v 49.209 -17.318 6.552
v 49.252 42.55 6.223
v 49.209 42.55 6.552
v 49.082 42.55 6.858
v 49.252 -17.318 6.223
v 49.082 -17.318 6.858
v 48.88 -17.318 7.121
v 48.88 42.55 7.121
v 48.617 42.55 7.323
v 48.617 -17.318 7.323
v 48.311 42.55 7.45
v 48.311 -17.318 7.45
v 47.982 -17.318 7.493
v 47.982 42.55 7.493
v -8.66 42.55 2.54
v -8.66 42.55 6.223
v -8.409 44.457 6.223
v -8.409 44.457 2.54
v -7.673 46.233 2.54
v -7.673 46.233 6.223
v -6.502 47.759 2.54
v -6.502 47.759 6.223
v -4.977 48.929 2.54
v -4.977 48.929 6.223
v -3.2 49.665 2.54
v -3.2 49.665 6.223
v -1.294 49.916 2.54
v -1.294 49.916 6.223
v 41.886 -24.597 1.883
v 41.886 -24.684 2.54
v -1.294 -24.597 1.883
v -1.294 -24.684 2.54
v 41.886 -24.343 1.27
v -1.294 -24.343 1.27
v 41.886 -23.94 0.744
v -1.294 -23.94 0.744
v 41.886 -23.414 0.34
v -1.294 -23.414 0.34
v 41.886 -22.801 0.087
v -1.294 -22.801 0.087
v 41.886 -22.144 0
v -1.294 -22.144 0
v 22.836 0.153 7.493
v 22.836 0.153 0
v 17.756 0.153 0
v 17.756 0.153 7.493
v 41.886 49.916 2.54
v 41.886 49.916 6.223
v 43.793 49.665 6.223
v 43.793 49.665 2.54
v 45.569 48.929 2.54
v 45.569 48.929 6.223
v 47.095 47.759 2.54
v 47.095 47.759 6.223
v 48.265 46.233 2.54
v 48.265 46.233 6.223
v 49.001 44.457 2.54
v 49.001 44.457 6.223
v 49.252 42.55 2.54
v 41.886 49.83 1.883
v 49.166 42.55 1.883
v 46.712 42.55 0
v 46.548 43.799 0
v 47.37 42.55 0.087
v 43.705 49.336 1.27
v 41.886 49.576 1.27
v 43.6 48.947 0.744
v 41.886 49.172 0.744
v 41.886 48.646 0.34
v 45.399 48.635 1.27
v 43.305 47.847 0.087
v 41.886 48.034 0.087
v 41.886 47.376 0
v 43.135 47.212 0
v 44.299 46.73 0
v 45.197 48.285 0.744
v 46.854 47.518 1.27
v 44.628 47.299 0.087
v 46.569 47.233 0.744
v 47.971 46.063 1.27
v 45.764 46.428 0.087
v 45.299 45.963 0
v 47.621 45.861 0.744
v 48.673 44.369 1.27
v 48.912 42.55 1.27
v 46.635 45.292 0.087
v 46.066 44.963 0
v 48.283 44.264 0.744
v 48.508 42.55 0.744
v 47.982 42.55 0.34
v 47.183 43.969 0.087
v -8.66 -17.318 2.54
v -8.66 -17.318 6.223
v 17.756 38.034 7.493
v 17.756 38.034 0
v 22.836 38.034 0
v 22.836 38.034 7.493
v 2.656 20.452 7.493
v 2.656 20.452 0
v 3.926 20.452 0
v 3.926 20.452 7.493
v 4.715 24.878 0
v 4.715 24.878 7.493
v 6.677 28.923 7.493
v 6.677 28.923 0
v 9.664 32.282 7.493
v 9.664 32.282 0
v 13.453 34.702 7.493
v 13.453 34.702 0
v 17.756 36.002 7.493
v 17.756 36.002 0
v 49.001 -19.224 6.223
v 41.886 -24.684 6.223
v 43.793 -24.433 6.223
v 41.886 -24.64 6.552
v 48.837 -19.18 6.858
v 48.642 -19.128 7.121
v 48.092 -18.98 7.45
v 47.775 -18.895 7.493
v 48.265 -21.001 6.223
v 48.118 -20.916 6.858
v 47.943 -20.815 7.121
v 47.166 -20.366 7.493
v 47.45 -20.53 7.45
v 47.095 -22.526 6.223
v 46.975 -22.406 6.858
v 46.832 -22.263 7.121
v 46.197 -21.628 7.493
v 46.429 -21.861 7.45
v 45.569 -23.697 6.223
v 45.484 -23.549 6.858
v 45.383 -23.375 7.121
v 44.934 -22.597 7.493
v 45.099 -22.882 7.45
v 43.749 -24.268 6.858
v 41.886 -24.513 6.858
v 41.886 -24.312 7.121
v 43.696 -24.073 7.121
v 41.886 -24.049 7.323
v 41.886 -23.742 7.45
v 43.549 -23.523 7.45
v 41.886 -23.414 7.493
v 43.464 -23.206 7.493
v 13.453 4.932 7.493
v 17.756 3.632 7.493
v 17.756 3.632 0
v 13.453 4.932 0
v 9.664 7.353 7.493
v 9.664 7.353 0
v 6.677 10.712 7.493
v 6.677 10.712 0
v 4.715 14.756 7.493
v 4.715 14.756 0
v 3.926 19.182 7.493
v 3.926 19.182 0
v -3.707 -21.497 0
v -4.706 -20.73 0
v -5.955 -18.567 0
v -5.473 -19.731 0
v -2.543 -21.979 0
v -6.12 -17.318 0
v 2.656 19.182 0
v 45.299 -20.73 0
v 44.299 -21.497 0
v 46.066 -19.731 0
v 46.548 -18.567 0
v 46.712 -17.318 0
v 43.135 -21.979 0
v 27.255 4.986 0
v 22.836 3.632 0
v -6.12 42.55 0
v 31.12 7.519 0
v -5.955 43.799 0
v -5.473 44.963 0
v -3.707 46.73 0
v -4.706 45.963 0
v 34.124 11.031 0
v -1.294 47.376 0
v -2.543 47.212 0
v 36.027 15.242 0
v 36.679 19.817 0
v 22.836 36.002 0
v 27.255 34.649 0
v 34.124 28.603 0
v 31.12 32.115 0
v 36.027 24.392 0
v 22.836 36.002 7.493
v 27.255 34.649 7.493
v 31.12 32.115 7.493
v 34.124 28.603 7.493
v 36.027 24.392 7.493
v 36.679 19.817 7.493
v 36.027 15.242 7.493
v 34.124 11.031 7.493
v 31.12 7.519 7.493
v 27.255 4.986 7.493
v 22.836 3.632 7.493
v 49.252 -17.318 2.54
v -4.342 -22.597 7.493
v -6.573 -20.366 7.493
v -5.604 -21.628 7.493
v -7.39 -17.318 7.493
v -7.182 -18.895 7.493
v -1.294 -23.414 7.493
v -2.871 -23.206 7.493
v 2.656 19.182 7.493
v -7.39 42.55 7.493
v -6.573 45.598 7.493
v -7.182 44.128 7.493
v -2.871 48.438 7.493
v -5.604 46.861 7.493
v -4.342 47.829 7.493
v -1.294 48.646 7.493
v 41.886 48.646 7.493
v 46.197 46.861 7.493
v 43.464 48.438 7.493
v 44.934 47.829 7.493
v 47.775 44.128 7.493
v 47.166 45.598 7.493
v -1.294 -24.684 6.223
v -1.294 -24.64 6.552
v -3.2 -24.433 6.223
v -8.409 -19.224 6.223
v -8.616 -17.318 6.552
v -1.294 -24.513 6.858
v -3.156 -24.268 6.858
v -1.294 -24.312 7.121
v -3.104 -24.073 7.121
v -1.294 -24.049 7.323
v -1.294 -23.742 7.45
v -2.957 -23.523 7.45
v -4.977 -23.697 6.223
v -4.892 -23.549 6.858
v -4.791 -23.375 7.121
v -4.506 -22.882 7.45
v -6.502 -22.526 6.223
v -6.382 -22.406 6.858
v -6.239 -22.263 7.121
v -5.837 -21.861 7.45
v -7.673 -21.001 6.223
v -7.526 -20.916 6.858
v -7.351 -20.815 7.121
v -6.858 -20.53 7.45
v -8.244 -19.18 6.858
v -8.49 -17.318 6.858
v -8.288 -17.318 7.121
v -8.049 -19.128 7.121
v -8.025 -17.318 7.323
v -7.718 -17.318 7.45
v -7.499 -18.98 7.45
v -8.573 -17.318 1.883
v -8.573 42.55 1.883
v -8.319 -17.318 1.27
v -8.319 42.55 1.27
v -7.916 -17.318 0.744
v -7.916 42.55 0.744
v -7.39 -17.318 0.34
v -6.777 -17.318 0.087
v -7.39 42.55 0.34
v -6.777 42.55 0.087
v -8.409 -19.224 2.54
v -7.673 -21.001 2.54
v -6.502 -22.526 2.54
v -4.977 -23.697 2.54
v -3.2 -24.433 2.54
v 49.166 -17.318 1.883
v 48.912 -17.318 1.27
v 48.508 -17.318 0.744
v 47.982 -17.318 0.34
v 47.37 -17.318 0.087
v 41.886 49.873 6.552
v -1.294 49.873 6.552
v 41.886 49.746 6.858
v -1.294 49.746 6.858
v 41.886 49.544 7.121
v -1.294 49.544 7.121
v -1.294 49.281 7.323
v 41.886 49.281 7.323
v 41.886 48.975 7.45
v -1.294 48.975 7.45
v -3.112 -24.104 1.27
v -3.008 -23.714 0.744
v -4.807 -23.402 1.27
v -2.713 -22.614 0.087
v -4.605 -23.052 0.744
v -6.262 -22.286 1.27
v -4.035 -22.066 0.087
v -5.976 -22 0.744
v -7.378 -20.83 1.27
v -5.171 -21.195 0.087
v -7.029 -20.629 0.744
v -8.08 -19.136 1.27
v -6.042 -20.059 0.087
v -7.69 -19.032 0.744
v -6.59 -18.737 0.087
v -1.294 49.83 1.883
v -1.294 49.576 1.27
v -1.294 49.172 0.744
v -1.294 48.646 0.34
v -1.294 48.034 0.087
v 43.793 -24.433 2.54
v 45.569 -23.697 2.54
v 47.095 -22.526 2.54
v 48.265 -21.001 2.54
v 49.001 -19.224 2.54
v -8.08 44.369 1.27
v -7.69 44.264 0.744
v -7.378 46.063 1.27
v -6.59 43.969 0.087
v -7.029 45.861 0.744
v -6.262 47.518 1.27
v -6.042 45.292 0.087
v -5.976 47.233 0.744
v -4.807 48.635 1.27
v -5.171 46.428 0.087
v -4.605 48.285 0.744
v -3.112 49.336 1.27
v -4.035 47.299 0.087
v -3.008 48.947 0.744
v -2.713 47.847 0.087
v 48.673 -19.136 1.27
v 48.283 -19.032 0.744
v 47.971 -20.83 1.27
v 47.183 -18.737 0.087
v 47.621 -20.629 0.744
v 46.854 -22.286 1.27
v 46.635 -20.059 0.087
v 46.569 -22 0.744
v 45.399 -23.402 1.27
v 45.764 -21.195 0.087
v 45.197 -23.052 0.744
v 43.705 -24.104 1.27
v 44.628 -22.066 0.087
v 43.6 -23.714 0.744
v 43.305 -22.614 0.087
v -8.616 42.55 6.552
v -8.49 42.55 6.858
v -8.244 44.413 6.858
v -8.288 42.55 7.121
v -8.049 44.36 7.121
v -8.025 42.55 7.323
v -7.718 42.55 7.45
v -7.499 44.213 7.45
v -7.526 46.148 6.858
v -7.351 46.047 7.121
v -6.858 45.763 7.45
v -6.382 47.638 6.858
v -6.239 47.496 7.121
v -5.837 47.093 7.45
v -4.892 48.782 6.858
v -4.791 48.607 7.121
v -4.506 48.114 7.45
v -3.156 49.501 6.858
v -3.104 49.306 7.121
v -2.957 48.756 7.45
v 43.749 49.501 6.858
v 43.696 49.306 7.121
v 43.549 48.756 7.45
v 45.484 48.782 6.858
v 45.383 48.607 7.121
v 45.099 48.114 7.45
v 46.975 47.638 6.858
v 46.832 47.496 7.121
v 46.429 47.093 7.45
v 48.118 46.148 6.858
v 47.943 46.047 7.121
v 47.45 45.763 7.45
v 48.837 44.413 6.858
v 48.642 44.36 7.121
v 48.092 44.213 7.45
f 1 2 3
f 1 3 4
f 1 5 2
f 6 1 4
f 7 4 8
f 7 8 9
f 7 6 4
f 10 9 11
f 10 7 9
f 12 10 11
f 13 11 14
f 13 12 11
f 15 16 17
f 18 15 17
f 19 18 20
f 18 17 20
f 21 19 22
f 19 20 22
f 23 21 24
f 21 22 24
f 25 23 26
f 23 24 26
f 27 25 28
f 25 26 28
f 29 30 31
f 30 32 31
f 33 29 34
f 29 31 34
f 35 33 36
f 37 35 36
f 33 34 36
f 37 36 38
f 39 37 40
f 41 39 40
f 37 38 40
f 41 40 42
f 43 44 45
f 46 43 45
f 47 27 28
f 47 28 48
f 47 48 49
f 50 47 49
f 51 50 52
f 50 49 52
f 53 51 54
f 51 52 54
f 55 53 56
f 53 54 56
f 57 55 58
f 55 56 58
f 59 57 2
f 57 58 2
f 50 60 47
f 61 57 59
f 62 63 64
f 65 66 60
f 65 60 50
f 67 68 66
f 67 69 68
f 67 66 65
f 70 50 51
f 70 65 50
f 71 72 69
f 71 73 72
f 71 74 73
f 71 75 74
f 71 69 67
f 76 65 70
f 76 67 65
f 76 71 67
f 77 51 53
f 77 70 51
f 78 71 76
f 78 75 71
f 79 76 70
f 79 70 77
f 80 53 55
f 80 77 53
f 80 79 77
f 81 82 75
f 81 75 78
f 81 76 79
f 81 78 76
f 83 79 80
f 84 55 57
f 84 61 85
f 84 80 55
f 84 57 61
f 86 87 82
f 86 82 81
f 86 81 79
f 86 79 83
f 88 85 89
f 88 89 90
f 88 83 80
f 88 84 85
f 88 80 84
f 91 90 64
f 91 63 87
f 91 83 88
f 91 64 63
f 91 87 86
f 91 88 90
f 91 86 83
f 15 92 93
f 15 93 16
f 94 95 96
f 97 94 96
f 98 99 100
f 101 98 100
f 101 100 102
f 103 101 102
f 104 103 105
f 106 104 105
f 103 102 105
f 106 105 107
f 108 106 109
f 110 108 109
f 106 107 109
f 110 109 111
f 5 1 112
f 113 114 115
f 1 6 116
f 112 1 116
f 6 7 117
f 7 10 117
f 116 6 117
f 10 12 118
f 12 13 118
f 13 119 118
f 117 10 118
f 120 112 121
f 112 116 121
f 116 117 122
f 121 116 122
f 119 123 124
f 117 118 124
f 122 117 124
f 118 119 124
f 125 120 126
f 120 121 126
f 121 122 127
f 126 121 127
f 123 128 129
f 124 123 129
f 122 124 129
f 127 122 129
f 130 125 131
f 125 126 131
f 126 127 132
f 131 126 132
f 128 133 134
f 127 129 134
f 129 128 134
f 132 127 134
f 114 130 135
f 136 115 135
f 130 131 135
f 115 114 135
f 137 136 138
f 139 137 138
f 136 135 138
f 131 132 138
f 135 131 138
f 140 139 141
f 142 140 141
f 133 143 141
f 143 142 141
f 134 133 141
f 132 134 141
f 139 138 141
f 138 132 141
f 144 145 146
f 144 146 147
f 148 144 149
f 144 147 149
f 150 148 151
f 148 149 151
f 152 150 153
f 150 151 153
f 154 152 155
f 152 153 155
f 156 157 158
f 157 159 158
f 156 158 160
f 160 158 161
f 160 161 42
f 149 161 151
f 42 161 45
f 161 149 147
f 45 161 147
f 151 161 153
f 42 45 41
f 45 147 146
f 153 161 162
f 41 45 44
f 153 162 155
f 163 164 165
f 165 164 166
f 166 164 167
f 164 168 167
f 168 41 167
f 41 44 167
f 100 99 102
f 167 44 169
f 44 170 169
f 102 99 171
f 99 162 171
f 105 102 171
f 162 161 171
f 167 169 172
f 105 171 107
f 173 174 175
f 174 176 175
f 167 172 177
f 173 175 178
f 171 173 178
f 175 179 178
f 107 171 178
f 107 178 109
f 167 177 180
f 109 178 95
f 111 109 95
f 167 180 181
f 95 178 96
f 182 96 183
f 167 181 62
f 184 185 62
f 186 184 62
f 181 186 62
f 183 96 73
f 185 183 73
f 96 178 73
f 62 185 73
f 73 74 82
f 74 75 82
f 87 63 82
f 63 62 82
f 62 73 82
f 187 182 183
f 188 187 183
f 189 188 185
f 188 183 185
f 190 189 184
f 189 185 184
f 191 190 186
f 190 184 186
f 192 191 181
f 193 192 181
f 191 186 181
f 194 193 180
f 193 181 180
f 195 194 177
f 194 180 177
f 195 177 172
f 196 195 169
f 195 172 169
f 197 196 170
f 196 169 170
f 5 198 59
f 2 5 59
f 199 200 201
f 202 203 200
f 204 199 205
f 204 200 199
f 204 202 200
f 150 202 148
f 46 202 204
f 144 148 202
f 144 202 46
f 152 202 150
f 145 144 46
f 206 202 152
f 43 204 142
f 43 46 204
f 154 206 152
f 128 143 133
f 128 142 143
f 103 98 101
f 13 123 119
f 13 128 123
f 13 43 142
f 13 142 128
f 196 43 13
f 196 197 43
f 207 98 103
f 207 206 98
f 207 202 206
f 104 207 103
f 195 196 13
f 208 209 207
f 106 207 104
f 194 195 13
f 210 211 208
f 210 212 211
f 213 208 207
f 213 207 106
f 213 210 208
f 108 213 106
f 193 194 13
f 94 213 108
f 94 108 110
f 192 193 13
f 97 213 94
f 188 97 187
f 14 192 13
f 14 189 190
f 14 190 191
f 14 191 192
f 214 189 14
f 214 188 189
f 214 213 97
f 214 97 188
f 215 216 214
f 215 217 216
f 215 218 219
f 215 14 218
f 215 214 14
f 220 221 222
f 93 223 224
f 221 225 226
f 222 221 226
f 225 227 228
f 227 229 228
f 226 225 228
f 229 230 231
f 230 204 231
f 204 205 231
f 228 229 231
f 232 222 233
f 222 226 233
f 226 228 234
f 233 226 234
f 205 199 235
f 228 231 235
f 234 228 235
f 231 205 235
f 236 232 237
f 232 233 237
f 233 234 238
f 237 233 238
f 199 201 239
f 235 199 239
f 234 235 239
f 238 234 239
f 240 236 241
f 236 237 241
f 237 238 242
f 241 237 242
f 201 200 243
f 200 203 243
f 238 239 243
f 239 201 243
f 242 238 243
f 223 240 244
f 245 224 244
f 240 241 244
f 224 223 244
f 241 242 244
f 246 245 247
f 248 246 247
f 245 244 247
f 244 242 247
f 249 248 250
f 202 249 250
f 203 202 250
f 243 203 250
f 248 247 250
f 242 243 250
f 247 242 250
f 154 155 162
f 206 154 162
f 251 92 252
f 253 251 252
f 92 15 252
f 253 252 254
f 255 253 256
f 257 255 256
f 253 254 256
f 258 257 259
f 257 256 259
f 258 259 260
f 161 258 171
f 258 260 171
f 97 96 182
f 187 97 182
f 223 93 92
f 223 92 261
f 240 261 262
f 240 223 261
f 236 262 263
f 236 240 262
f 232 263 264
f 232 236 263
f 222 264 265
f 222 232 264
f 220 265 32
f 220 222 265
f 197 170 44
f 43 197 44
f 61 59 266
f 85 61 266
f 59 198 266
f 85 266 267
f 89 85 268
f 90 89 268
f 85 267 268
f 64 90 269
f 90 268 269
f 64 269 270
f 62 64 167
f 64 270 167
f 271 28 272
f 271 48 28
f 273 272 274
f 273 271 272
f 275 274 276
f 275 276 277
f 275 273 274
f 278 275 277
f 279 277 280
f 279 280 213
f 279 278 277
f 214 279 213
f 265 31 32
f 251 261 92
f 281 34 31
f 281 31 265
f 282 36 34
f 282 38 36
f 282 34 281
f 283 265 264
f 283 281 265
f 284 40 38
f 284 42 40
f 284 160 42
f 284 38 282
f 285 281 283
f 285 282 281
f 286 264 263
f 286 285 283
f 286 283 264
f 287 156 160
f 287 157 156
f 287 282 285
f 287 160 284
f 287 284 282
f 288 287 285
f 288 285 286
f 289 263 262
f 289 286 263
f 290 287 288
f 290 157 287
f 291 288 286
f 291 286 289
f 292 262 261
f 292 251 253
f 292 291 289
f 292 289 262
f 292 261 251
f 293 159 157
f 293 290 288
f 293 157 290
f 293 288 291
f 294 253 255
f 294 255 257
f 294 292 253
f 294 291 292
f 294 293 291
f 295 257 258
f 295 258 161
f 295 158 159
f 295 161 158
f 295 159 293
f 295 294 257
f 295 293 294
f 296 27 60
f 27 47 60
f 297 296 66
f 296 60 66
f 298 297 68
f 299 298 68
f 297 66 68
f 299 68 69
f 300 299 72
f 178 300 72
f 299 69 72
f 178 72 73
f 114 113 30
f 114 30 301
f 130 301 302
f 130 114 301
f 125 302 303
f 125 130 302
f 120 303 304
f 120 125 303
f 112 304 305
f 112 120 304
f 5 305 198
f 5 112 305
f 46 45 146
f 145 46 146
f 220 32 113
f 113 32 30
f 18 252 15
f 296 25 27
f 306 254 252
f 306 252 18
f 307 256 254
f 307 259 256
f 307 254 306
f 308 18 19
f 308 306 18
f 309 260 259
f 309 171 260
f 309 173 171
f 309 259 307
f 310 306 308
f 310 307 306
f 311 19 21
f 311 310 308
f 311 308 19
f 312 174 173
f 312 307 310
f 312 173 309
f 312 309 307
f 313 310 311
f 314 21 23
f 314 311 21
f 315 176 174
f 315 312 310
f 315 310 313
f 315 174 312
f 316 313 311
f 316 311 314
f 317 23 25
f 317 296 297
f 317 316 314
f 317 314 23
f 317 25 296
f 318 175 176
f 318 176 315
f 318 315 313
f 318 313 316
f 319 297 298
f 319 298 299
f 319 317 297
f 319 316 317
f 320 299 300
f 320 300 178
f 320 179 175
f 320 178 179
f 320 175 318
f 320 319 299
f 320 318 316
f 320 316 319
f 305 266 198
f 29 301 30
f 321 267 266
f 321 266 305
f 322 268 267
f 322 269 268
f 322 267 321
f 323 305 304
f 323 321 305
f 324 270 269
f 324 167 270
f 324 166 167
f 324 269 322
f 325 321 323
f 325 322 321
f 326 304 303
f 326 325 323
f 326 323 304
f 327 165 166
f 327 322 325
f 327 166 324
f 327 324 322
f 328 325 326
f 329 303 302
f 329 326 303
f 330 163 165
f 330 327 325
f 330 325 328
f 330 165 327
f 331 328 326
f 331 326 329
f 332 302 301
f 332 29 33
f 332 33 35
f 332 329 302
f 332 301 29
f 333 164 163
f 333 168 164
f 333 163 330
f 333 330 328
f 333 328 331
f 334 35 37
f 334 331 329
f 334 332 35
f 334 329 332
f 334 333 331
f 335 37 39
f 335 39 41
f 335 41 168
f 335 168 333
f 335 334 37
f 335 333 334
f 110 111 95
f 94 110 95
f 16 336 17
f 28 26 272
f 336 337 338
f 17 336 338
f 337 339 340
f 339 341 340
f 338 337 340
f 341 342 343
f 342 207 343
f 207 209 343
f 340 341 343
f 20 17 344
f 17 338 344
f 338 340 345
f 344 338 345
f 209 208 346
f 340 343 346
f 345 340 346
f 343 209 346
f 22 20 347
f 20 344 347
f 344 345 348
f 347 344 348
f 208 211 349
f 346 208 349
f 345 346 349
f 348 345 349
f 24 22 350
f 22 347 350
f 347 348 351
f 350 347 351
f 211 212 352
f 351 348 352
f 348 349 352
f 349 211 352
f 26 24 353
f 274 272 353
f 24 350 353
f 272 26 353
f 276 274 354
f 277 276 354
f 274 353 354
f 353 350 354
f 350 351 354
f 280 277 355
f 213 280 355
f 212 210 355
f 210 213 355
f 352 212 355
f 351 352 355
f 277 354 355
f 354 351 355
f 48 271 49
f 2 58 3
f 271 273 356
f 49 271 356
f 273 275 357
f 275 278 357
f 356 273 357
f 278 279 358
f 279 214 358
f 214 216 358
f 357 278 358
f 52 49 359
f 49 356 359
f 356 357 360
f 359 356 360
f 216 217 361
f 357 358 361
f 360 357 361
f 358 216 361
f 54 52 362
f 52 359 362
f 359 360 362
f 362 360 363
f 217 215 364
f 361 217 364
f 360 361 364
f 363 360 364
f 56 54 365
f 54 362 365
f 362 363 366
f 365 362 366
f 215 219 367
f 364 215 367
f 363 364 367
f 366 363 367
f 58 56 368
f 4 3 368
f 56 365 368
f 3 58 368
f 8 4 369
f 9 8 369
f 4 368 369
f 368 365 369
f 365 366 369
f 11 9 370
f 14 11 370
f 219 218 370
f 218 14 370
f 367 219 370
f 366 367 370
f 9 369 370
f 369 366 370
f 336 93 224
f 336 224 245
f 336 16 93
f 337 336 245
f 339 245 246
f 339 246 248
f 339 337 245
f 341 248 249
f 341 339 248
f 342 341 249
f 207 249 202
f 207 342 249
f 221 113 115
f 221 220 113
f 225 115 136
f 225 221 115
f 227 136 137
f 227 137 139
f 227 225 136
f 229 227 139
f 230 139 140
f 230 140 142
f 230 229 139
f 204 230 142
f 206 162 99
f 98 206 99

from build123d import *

# Parameters (mm, degrees)
F0_W     = 57.912
F0_H     = 74.5998
F1_DEPTH = 7.493
F2_R     = 7.366
F3_R     = 1.27
F4_R     = 2.54


with BuildPart() as f1:
    # F0 (on Top) → F1 (new body)
    with BuildSketch(Plane.XY):
        with Locations((20.296287, 12.616272)):
            Rectangle(F0_W, F0_H)
        with BuildLine():
            ThreePointArc((17.756287, 3.632269), (8.054824, 8.929138), (3.925598, 19.182172))
            Line((3.925598, 19.182172), (2.655598, 19.182172))
            Line((2.655598, 19.182172), (2.655598, 20.452172))
            Line((2.655598, 20.452172), (3.925598, 20.452172))
            ThreePointArc((3.925598, 20.452172), (8.054824, 30.705205), (17.756287, 36.002075))
            Line((17.756287, 36.002075), (17.756287, 38.034075))
            Line((17.756287, 38.034075), (22.836287, 38.034075))
            Line((22.836287, 38.034075), (22.836287, 36.002075))
            ThreePointArc((22.836287, 36.002075), (36.679287, 19.817172), (22.836287, 3.632269))
            Line((22.836287, 3.632269), (22.836287, 0.153448))
            Line((22.836287, 0.153448), (17.756287, 0.153448))
            Line((17.756287, 0.153448), (17.756287, 3.632269))
        make_face(mode=Mode.SUBTRACT)
    extrude(amount=F1_DEPTH)

    # F2
    f2_edges = [f1.edges().sort_by_distance(p)[0] for p in [
        (-8.659713, -24.683628, 3.7465),
        (49.252287, -24.683628, 3.7465),
        (49.252287, 49.916172, 3.7465),
        (-8.659713, 49.916172, 3.7465),
    ]]
    fillet(f2_edges, radius=F2_R)

    # F3
    f3_edges = [f1.edges().sort_by_distance(p)[0] for p in [
        (-8.659713, 12.616272, 7.493),
    ]]
    fillet(f3_edges, radius=F3_R)

    # F4
    f4_edges = [f1.edges().sort_by_distance(p)[0] for p in [
        (-8.659713, 12.616272, 0),
    ]]
    fillet(f4_edges, radius=F4_R)


solid = f1.part
